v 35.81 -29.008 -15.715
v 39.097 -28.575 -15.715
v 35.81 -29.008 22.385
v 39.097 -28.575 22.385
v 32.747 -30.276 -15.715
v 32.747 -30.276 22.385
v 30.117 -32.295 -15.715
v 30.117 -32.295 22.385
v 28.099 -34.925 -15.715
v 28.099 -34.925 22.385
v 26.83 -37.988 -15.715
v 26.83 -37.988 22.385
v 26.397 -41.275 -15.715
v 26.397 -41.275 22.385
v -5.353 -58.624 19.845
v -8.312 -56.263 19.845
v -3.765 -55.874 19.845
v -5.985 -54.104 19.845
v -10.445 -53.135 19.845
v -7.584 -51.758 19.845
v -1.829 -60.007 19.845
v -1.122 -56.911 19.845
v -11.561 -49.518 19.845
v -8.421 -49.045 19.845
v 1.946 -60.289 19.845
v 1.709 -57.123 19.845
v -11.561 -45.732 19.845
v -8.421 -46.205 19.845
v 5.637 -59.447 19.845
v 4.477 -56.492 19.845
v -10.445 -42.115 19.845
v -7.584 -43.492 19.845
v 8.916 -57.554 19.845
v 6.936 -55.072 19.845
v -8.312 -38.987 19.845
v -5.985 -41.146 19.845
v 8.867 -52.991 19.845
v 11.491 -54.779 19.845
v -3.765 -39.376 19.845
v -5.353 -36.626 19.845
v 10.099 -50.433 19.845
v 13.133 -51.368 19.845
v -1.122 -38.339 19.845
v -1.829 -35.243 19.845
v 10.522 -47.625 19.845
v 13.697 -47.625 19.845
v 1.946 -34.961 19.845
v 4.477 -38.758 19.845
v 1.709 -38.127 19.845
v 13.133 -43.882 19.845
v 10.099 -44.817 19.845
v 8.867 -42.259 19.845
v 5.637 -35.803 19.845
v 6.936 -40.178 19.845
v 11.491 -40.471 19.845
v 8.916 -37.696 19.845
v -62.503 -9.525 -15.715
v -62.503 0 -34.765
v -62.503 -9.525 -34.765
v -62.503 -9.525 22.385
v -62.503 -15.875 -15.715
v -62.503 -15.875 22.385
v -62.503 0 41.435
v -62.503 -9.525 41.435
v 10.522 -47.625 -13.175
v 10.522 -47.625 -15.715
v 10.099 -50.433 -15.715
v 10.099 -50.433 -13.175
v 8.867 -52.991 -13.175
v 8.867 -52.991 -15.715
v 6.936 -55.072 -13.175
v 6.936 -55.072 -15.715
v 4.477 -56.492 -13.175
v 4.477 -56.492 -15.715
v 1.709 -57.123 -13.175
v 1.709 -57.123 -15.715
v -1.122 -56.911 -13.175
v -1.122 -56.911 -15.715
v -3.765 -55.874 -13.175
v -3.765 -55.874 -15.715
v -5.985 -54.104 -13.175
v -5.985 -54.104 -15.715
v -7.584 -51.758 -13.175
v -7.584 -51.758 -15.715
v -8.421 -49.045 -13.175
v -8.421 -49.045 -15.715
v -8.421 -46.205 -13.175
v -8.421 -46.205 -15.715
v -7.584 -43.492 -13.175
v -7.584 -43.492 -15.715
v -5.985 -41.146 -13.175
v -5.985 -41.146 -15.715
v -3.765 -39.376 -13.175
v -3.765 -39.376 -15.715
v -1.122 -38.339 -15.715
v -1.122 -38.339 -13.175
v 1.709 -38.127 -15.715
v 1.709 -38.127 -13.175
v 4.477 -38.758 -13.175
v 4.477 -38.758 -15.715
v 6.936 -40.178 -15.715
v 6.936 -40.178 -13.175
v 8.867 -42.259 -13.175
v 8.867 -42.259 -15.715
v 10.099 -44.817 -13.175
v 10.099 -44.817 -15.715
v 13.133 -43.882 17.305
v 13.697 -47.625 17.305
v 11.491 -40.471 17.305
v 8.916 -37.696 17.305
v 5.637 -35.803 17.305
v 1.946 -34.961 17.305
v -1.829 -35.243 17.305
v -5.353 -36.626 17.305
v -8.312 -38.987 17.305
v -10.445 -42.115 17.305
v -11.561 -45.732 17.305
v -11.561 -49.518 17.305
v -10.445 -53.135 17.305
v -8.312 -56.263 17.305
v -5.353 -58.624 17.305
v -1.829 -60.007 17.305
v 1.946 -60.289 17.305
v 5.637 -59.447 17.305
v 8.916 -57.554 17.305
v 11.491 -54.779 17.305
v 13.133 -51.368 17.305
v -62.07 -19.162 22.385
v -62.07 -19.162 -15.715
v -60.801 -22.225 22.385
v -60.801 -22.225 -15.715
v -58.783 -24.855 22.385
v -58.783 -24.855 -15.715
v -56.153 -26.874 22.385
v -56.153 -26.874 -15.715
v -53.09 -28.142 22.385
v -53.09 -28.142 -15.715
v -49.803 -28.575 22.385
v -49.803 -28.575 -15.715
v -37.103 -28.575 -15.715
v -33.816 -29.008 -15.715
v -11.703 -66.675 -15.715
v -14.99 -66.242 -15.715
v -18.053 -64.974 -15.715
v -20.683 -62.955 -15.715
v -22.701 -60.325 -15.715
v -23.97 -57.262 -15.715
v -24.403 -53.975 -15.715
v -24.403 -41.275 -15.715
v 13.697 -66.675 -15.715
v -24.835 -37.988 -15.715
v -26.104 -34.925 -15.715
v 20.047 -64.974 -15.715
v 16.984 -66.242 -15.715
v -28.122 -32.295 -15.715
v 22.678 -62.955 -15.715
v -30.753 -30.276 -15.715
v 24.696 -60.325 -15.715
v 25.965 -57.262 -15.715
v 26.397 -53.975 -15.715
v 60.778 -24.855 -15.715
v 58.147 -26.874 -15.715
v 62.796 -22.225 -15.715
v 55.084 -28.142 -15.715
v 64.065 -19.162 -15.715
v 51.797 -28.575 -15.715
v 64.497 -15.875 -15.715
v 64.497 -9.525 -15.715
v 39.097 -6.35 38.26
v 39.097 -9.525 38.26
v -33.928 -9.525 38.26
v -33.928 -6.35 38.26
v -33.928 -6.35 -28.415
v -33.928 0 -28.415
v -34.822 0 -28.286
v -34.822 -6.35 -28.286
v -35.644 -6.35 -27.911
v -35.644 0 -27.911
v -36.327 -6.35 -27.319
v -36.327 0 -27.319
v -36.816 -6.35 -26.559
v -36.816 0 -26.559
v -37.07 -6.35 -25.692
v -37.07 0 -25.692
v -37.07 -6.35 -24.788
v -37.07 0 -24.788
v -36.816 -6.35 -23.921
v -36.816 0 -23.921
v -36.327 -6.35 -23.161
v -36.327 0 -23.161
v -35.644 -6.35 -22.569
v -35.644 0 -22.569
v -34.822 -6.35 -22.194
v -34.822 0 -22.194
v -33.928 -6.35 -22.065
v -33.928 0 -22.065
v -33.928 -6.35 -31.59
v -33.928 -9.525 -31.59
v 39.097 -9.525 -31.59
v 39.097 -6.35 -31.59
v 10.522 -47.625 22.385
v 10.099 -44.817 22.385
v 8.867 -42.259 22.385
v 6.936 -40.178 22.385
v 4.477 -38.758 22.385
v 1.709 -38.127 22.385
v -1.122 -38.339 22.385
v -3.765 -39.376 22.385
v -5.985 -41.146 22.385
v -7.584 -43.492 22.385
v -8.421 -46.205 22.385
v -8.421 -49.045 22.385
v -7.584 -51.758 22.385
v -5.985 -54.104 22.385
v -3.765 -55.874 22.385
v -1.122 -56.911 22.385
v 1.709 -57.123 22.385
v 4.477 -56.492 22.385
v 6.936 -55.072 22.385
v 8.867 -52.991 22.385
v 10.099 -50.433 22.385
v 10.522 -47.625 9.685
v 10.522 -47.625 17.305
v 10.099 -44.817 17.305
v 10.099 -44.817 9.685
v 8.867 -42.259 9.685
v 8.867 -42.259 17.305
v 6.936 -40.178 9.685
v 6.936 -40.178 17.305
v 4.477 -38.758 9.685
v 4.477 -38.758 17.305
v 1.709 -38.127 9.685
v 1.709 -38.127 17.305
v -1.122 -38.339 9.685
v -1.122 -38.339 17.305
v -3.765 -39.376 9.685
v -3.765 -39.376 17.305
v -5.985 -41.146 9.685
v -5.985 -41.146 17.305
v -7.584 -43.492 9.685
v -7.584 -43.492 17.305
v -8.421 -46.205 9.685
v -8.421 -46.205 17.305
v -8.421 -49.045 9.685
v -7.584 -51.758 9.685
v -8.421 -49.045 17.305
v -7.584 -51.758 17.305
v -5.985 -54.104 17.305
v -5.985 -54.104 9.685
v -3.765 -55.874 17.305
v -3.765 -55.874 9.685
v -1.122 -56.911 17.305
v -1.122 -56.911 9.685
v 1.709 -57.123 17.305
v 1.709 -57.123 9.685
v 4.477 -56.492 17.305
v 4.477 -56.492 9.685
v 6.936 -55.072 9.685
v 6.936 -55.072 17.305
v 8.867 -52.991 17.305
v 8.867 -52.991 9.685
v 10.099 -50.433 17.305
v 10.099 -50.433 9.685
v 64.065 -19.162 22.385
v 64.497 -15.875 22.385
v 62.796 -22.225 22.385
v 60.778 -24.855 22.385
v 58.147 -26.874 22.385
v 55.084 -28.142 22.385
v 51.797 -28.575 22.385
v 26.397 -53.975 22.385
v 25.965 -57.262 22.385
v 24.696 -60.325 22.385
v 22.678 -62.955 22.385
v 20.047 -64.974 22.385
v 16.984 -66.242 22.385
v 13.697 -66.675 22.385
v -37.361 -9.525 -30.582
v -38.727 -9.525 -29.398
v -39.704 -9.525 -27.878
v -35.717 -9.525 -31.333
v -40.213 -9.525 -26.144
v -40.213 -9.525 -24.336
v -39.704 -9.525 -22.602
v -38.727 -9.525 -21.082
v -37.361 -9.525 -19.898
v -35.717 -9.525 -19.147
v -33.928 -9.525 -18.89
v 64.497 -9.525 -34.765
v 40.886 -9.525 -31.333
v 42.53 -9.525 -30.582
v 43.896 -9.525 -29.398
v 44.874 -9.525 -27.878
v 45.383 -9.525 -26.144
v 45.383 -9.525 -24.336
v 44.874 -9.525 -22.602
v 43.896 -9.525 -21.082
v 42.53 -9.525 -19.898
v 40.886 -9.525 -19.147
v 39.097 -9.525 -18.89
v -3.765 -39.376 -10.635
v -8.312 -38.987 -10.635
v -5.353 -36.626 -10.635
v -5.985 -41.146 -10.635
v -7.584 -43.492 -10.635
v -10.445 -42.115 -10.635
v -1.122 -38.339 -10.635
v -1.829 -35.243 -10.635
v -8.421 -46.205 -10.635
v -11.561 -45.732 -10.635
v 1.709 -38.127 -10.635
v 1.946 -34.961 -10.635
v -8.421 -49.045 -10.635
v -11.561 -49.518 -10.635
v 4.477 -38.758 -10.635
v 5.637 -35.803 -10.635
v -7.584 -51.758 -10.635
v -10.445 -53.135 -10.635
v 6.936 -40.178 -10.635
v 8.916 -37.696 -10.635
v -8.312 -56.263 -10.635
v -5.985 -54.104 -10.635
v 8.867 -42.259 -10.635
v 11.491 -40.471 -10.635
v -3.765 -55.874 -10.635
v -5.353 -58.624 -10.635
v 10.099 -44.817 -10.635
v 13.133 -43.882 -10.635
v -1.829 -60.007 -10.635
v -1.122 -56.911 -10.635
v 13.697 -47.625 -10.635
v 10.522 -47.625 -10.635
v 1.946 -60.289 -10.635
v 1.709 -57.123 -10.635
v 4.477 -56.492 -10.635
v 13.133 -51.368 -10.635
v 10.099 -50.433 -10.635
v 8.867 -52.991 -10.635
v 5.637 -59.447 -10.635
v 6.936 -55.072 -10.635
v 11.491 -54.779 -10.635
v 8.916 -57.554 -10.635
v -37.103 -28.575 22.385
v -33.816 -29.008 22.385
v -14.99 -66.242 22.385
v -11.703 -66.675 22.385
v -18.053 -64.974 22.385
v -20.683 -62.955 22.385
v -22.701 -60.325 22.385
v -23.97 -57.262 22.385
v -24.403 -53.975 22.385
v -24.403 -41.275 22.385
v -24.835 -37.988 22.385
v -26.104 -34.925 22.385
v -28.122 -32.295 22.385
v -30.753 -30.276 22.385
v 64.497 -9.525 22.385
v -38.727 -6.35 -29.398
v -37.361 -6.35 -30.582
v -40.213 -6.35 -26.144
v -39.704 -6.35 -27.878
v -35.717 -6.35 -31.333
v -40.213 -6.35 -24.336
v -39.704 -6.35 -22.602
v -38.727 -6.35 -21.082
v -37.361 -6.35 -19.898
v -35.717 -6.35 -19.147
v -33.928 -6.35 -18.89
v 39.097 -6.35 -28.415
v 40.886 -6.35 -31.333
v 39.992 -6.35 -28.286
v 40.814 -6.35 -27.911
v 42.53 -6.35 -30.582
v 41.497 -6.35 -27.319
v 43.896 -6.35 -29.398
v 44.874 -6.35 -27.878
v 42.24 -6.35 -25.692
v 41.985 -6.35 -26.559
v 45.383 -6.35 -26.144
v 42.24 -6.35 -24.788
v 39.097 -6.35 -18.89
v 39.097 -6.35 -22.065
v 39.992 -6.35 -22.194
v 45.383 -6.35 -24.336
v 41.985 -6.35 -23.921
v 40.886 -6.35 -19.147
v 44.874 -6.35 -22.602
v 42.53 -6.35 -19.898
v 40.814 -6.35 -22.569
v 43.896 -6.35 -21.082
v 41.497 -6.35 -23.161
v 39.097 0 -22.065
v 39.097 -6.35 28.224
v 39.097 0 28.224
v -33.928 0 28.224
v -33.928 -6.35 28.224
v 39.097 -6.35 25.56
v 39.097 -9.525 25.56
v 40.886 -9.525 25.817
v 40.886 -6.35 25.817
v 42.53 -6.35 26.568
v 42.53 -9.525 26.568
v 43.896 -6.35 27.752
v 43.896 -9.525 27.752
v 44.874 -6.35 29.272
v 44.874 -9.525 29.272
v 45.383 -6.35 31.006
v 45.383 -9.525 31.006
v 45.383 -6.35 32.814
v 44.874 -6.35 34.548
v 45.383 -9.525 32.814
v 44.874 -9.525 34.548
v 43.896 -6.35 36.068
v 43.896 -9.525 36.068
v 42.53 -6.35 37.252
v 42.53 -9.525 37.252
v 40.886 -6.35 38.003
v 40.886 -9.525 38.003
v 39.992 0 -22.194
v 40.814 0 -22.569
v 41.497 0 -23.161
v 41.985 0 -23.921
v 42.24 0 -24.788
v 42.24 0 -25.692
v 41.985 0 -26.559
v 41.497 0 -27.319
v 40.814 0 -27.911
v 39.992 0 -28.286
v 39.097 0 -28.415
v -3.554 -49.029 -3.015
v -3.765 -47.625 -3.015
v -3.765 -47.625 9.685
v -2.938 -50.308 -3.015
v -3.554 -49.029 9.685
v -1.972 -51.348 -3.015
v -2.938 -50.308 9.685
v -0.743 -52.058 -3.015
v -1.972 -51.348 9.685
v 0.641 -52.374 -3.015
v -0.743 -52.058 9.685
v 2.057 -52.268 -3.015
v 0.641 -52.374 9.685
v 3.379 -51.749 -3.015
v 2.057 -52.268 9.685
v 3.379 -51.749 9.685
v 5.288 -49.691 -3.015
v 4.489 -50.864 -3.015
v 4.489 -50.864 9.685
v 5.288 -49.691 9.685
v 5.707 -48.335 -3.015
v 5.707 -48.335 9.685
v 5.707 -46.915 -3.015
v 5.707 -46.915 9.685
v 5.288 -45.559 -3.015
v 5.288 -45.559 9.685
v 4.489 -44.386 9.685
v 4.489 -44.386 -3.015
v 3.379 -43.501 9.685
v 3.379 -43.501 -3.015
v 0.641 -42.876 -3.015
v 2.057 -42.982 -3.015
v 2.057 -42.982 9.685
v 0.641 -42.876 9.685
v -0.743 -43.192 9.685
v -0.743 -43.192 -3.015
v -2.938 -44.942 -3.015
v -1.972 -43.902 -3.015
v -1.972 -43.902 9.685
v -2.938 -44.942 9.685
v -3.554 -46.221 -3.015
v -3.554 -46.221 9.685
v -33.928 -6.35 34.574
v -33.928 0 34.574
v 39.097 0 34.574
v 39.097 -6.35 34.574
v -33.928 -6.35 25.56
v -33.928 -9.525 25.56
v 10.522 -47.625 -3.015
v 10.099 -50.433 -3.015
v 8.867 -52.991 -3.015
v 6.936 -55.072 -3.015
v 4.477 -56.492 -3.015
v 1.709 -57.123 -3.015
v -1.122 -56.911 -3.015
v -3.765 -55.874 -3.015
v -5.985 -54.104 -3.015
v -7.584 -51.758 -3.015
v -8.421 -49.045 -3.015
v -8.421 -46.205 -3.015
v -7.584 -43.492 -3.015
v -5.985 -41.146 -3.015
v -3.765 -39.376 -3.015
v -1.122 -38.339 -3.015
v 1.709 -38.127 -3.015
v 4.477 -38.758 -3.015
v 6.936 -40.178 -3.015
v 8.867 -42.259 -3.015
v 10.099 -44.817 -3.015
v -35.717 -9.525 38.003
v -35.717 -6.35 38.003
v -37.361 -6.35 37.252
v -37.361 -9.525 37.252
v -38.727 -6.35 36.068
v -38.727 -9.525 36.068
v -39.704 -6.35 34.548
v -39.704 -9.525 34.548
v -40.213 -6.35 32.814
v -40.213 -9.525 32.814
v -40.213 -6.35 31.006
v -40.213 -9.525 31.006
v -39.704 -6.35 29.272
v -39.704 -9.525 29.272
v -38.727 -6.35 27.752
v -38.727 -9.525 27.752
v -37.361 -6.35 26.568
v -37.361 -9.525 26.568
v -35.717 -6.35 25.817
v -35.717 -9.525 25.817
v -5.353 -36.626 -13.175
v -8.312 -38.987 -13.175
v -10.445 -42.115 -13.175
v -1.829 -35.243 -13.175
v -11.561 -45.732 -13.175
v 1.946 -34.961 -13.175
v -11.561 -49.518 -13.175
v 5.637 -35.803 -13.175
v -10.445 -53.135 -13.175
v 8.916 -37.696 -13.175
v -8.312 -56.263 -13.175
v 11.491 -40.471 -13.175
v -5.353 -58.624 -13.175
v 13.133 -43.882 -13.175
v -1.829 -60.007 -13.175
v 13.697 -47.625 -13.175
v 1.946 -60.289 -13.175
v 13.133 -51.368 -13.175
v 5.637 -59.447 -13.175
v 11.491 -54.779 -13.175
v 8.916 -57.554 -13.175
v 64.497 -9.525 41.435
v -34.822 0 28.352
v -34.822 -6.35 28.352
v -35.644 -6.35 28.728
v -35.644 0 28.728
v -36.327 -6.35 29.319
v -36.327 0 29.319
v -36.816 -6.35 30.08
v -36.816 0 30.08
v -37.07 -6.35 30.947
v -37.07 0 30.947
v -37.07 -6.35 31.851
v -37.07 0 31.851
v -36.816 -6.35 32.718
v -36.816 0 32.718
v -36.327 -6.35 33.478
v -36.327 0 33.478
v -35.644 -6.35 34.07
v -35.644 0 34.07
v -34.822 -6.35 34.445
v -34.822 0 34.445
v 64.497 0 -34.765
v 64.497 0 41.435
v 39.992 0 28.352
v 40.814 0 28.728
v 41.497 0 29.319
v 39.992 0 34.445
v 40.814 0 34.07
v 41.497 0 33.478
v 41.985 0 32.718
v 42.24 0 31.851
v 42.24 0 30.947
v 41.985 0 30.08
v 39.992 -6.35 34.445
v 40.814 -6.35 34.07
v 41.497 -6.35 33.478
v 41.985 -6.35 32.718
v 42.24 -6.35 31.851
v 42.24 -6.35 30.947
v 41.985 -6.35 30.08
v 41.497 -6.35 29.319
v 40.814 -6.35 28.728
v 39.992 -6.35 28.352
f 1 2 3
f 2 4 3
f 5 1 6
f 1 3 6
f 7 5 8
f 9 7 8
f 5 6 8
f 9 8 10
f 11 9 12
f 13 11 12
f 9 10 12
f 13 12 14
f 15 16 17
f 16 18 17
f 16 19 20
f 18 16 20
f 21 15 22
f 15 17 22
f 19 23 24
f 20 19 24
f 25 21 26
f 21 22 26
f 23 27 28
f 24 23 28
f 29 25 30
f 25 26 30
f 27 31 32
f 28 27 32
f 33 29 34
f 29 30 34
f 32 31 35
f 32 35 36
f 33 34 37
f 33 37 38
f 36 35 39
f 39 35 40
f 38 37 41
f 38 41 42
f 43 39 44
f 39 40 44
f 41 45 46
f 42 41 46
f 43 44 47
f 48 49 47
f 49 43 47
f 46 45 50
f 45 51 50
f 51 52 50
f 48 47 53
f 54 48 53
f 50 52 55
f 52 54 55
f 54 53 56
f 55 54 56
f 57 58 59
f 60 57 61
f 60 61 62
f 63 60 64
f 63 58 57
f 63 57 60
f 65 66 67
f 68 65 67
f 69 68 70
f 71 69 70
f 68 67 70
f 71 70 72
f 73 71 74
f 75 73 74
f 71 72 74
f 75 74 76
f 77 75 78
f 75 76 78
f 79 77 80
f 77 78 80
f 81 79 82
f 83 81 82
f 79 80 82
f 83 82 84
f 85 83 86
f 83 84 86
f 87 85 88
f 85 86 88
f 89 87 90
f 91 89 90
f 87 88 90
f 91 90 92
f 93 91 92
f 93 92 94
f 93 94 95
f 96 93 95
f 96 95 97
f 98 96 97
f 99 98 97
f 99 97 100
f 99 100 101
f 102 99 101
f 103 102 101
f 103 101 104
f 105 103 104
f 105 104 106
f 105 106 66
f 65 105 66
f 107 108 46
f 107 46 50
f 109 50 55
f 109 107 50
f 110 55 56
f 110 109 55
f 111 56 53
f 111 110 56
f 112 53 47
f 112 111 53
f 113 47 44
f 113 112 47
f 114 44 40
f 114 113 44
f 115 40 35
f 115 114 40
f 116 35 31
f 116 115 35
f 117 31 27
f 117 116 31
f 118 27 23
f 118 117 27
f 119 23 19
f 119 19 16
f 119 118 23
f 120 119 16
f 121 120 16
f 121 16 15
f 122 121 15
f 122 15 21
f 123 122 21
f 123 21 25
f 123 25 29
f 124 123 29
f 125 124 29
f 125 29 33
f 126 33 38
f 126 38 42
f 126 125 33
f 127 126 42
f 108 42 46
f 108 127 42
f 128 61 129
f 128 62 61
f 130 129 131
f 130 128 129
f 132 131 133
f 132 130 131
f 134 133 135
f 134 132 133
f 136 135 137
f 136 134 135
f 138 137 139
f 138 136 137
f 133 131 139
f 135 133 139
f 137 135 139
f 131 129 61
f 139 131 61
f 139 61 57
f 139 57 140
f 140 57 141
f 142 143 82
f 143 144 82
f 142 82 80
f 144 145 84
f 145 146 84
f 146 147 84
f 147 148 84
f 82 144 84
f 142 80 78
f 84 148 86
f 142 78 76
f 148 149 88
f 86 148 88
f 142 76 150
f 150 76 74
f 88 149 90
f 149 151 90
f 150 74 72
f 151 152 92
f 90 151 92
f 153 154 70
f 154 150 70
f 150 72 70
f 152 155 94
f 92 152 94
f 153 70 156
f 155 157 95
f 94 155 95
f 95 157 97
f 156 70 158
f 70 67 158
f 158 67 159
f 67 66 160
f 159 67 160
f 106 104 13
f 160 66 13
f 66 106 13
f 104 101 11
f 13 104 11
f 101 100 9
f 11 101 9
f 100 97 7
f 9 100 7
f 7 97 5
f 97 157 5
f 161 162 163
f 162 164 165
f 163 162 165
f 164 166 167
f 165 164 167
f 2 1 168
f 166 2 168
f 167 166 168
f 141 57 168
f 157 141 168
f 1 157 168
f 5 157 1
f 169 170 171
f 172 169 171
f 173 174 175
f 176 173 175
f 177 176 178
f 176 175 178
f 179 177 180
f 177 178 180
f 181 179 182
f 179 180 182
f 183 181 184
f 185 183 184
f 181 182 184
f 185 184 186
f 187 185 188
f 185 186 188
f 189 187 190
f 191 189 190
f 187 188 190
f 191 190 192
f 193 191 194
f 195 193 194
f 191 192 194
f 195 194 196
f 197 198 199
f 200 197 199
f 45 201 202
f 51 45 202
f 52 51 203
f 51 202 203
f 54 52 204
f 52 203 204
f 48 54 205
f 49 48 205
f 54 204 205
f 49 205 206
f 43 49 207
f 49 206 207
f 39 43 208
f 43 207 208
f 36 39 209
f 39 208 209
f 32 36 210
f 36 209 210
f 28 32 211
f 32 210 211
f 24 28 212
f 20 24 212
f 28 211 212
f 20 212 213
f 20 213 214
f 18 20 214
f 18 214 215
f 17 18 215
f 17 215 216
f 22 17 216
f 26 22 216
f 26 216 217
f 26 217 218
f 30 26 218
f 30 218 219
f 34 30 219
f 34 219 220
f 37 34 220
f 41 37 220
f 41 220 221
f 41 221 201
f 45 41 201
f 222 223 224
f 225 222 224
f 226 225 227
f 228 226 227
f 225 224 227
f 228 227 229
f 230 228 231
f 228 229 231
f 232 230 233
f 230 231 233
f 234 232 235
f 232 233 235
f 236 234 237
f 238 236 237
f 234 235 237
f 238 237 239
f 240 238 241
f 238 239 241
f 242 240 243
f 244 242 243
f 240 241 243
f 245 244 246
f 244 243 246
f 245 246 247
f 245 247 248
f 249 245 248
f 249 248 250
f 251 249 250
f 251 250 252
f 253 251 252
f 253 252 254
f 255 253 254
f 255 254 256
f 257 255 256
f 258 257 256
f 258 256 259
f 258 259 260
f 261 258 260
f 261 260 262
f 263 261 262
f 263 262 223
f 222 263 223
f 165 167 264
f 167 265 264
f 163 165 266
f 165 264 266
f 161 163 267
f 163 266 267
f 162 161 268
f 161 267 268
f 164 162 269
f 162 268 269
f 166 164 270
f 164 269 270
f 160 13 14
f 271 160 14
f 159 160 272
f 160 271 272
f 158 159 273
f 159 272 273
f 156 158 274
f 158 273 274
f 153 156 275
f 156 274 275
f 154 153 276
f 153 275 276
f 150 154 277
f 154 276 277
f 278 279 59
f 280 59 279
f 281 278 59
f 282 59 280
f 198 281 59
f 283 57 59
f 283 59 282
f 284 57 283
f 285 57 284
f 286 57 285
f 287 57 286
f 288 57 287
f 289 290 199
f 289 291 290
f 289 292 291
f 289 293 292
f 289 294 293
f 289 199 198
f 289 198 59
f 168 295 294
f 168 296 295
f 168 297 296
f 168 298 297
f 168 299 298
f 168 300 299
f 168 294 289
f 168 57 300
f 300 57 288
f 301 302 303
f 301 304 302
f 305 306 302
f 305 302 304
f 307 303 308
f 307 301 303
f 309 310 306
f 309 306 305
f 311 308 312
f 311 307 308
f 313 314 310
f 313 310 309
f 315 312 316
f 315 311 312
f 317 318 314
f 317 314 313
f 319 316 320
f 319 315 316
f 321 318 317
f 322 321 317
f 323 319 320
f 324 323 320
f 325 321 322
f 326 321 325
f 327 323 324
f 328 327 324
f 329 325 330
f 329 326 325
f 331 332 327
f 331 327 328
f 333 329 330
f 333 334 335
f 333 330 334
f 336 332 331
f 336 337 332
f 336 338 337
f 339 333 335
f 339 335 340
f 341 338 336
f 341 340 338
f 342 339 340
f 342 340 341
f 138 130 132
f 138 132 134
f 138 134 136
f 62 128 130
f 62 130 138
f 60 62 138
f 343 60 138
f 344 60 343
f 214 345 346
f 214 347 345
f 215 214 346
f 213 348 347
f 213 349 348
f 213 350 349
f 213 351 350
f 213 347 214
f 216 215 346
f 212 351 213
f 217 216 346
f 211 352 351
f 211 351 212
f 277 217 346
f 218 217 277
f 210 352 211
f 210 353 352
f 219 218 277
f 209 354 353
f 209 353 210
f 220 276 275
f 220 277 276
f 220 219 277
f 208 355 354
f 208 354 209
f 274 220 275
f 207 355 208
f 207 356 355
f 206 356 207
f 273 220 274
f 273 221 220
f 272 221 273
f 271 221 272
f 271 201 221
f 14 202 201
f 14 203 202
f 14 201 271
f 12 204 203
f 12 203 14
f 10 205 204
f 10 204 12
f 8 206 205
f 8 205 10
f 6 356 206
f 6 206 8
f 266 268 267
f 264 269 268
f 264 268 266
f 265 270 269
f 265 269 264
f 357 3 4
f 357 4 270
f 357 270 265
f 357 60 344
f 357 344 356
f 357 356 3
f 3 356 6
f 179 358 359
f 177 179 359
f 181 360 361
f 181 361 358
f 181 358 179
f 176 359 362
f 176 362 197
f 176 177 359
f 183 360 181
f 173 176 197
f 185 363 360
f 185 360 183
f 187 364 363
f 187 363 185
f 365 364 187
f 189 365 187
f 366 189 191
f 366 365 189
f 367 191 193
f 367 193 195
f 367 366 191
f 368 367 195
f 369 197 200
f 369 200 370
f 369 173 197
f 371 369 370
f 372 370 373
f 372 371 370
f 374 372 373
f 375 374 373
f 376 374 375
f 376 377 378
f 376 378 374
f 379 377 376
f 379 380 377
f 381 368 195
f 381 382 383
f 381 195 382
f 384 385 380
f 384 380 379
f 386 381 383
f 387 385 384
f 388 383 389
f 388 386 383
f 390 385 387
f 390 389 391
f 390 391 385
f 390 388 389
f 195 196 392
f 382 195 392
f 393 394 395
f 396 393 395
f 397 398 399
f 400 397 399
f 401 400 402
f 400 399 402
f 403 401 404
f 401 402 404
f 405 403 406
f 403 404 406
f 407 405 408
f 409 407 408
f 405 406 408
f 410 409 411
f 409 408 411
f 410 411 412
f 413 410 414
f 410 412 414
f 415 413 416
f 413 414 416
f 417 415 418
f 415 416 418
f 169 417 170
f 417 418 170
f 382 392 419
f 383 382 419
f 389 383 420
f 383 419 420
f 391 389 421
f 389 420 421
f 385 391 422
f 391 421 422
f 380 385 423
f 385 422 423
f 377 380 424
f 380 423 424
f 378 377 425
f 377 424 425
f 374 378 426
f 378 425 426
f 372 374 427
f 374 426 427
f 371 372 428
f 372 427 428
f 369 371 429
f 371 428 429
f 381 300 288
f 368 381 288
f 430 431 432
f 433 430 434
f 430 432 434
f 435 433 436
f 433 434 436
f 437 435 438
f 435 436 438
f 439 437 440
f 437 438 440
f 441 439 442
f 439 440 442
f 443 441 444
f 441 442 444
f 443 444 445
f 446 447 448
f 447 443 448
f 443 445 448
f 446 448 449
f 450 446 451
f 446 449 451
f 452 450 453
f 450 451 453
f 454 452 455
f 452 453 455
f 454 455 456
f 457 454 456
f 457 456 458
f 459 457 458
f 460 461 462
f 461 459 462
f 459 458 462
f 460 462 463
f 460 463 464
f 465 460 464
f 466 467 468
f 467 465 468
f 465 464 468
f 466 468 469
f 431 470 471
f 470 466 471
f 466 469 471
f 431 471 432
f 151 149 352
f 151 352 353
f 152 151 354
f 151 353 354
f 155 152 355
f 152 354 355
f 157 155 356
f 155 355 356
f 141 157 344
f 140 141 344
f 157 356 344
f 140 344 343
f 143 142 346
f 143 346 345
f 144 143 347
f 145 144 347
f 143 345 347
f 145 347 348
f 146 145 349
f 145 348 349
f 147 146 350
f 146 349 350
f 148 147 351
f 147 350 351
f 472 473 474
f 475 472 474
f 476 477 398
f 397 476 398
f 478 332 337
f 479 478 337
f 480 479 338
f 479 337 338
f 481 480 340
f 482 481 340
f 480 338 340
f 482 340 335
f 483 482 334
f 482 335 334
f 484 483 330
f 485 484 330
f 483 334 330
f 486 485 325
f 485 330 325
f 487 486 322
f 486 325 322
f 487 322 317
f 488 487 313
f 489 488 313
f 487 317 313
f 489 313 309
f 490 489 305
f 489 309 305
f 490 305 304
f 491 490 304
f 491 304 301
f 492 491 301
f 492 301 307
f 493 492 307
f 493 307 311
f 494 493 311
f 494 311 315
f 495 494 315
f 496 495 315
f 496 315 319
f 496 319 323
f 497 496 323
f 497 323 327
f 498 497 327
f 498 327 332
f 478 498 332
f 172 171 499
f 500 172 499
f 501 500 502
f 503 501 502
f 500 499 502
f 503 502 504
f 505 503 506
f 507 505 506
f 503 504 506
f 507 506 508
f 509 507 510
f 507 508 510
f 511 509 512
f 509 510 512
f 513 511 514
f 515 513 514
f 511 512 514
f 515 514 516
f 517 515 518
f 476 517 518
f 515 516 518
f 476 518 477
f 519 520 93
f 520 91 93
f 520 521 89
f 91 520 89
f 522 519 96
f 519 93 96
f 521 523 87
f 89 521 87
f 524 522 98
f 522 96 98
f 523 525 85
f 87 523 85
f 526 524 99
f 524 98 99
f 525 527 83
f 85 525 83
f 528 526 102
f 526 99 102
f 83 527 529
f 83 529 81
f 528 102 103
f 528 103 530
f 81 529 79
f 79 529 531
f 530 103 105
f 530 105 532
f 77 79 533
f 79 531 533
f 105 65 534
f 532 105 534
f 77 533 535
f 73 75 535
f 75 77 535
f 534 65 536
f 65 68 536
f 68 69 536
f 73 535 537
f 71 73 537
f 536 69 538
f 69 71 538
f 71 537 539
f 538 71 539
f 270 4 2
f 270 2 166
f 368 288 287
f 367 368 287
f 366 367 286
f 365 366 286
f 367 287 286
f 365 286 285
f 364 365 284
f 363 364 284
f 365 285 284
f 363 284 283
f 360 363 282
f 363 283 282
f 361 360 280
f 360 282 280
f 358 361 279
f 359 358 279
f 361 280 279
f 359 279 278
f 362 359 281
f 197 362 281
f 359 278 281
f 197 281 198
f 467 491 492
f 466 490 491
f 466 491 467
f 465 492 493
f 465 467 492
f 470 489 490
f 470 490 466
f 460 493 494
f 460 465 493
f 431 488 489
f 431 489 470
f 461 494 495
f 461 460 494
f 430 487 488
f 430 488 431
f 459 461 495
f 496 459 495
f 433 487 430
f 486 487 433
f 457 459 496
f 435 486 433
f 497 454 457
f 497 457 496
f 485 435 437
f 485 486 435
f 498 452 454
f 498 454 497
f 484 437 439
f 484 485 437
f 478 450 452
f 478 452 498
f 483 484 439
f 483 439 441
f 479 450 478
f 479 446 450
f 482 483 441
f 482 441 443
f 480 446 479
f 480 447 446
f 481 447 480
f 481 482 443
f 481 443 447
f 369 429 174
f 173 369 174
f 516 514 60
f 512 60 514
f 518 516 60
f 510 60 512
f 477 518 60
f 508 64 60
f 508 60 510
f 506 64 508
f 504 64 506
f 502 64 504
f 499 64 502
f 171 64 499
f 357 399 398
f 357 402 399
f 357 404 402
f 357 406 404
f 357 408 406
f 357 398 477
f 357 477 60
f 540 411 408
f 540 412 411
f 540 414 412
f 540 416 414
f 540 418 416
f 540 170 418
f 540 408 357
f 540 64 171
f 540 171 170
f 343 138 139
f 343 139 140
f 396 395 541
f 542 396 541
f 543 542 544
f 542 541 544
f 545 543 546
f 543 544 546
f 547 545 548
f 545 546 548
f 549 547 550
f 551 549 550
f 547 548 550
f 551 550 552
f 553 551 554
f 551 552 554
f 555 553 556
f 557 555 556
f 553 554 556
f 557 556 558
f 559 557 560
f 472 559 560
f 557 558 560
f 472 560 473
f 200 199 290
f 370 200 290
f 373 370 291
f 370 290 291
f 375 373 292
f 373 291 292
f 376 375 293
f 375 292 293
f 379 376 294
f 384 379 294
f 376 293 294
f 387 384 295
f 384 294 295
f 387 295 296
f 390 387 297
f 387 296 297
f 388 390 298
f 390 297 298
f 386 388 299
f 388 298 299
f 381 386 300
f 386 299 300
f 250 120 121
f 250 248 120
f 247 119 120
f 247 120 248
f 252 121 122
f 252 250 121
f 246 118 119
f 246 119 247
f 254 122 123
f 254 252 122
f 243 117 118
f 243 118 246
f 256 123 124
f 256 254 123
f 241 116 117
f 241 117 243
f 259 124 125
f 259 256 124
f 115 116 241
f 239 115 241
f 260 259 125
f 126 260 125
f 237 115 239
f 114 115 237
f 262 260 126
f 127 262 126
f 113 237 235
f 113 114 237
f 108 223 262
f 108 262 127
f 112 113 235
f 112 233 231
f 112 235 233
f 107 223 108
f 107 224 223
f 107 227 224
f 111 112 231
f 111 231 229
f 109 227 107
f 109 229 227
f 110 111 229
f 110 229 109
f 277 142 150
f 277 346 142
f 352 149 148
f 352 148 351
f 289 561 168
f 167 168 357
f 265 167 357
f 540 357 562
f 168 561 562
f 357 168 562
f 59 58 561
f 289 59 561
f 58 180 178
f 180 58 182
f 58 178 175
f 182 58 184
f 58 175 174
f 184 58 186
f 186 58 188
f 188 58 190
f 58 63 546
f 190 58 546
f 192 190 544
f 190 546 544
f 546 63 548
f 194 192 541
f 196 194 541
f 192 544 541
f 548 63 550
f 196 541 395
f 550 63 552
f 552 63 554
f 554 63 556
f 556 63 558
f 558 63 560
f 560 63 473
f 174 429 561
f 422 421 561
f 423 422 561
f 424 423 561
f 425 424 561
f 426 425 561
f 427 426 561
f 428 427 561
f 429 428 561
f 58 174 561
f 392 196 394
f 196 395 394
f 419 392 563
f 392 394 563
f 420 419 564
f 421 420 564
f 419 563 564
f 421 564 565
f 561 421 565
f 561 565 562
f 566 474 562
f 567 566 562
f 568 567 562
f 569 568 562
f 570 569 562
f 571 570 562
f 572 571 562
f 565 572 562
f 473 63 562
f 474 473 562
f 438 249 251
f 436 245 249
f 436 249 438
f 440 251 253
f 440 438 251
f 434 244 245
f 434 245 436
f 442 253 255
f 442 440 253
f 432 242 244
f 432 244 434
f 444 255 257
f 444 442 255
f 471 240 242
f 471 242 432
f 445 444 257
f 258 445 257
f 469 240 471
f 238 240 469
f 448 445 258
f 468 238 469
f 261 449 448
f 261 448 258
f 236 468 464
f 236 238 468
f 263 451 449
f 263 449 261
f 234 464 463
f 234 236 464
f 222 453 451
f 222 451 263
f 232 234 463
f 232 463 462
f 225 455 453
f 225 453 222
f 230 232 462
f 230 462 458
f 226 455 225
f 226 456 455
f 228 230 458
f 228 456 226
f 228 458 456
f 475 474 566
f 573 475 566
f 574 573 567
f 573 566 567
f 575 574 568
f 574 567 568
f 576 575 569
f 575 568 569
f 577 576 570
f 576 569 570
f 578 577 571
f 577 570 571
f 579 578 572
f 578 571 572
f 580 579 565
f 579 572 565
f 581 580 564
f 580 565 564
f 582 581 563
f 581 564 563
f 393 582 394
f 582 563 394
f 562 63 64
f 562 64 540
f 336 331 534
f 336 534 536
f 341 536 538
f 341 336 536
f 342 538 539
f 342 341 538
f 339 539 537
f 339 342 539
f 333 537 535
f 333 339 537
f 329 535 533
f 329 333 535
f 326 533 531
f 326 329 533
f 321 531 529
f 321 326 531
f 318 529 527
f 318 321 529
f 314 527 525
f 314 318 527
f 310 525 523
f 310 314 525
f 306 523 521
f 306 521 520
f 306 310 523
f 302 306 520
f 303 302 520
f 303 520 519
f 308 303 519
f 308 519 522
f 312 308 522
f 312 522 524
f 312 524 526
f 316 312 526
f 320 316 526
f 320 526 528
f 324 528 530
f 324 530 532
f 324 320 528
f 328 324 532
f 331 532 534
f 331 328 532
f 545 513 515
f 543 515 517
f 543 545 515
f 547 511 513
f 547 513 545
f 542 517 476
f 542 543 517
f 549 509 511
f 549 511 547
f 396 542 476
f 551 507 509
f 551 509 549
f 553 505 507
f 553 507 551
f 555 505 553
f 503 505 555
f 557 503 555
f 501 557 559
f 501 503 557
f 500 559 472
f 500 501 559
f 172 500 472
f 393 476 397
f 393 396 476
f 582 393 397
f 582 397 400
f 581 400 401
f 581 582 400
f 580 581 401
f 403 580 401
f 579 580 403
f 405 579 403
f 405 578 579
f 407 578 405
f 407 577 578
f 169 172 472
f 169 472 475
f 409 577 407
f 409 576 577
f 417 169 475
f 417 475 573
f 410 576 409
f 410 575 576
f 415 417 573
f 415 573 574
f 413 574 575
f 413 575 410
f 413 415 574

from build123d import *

# Parameters (mm, degrees)
F0_W       = 127
F0_H       = 76.2
F1_DEPTH   = 9.525
F3_DEPTH   = 3.175
F4_W       = 127
F4_H       = 38.1
F5_DEPTH   = 19.05
F6_W       = 50.8
F6_H       = 38.1
F7_DEPTH   = 38.1
F9_D       = 9.525
F10_R      = 9.525
F10_R_2    = 4.7625
F11_DEPTH  = 12.7
F12_R      = 9.525
F12_R_2    = 4.7625
F13_DEPTH  = 12.7
F17_R      = 12.7
F7_FACE_R  = 9.525
F18_DEPTH  = 2.54
F15_R      = 12.7
F7_FACE1_R = 9.525
F19_DEPTH  = 2.54
F20_R      = 12.7
F21_R      = 12.7


with BuildPart() as f1:
    # F0 (on Front) → F1 (new body)
    with BuildSketch(Plane.XZ):
        with Locations((0.997369945, 3.3350293577)):
            Rectangle(F0_W, F0_H)
        with BuildLine():
            ThreePointArc((-33.927630055, -28.4149706423), (-37.102630055, -25.2399706423), (-33.927630055, -22.0649706423))
            Line((-33.927630055, -22.0649706423), (39.097369945, -22.0649706423))
            ThreePointArc((39.097369945, -22.0649706423), (42.272369945, -25.2399706423), (39.097369945, -28.4149706423))
            Line((39.097369945, -28.4149706423), (-33.927630055, -28.4149706423))
        make_face(mode=Mode.SUBTRACT)
        with BuildLine():
            Line((39.097369945, 28.2236666642), (-33.927630055, 28.2236666642))
            ThreePointArc((-33.927630055, 28.2236666642), (-37.102630055, 31.3986666642), (-33.927630055, 34.5736666642))
            Line((-33.927630055, 34.5736666642), (39.097369945, 34.5736666642))
            ThreePointArc((39.097369945, 34.5736666642), (42.272369945, 31.3986666642), (39.097369945, 28.2236666642))
        make_face(mode=Mode.SUBTRACT)
    extrude(amount=F1_DEPTH)

    # F2 (on face) → F3 (cut)
    with BuildSketch(Plane.XZ.offset(9.525)):
        with BuildLine():
            Line((39.097369945, -18.8899706423), (-33.927630055, -18.8899706423))
            ThreePointArc((-33.927630055, -18.8899706423), (-40.277630055, -25.2399706423), (-33.927630055, -31.5899706423))
            Line((-33.927630055, -31.5899706423), (39.097369945, -31.5899706423))
            ThreePointArc((39.097369945, -31.5899706423), (45.447369945, -25.2399706423), (39.097369945, -18.8899706423))
        make_face()
        with BuildLine():
            Line((39.097369945, -28.4149706423), (-33.927630055, -28.4149706423))
            ThreePointArc((-33.927630055, -28.4149706423), (-37.102630055, -25.2399706423), (-33.927630055, -22.0649706423))
            Line((-33.927630055, -22.0649706423), (39.097369945, -22.0649706423))
            ThreePointArc((39.097369945, -22.0649706423), (42.272369945, -25.2399706423), (39.097369945, -28.4149706423))
        make_face(mode=Mode.SUBTRACT)
        with BuildLine():
            ThreePointArc((-33.927630055, 38.2600293577), (-40.277630055, 31.9100293577), (-33.927630055, 25.5600293577))
            Line((-33.927630055, 25.5600293577), (39.097369945, 25.5600293577))
            ThreePointArc((39.097369945, 25.5600293577), (45.447369945, 31.9100293577), (39.097369945, 38.2600293577))
            Line((39.097369945, 38.2600293577), (-33.927630055, 38.2600293577))
        make_face()
        with BuildLine():
            Line((-33.927630055, 34.5736666642), (39.097369945, 34.5736666642))
            ThreePointArc((39.097369945, 34.5736666642), (42.272369945, 31.3986666642), (39.097369945, 28.2236666642))
            Line((39.097369945, 28.2236666642), (-33.927630055, 28.2236666642))
            ThreePointArc((-33.927630055, 28.2236666642), (-37.102630055, 31.3986666642), (-33.927630055, 34.5736666642))
        make_face(mode=Mode.SUBTRACT)
    extrude(amount=-F3_DEPTH, mode=Mode.SUBTRACT)

    # F4 (on face) → F5 (join)
    with BuildSketch(Plane.XZ.offset(9.525)):
        with Locations((0.997369945, 3.3350293577)):
            Rectangle(F4_W, F4_H)
    extrude(amount=F5_DEPTH)

    # F6 (on face) → F7 (join)
    with BuildSketch(Plane.XZ.offset(28.575)):
        with Locations((0.997369945, 3.3350293577)):
            Rectangle(F6_W, F6_H)
    extrude(amount=F7_DEPTH)

    # F9 (through all)
    with Locations(Plane(origin=(0, 0, -15.7149706423), x_dir=(1, 0, 0), z_dir=(0, 0, -1))):
        with Locations((0.997369945, 47.625)):
            Hole(F9_D / 2)

    # F10 (on face) → F11 (cut)
    with BuildSketch(Plane(origin=(0, 0, -15.7149706423), x_dir=(1, 0, 0), z_dir=(0, 0, -1))):
        with Locations((0.997369945, 47.625)):
            Circle(F10_R)
        with Locations((0.997369945, 47.625)):
            Circle(F10_R_2, mode=Mode.SUBTRACT)
    extrude(amount=-F11_DEPTH, mode=Mode.SUBTRACT)

    # F12 (on face) → F13 (cut)
    with BuildSketch(Plane.XY.offset(22.3850293577)):
        with Locations((0.997369945, -47.625)):
            Circle(F12_R)
        with Locations((0.997369945, -47.625)):
            Circle(F12_R_2, mode=Mode.SUBTRACT)
        with Locations((0.997369945, -47.625)):
            Circle(F12_R)
    extrude(amount=-F13_DEPTH, mode=Mode.SUBTRACT)

    # F17 (on offset) + F7_face (on face) → F18 (cut)
    with BuildSketch(Plane(origin=(0, 0, -10.6349706423), x_dir=(1, 0, 0), z_dir=(0, 0, -1))):
        with Locations((0.997369945, 47.625)):
            Circle(F17_R)
    with BuildSketch(Plane(origin=(0.997369945, -31.75, -15.7149706423), x_dir=(1, 0, 0), z_dir=(0, 0, -1))):
        Polygon((-63.5, -3.175), (-63.5, -22.225), (63.5, -22.225), (63.5, -3.175), (25.4, -3.175), (25.4, 34.925), (-25.4, 34.925), (-25.4, -3.175), align=None)
        with Locations((0, 15.875)):
            Circle(F7_FACE_R, mode=Mode.SUBTRACT)
    extrude(amount=F18_DEPTH, mode=Mode.SUBTRACT)

    # F15 (on offset) + F7_face1 (on face) → F19 (cut)
    with BuildSketch(Plane.XY.offset(17.3050293577)):
        with Locations((0.997369945, -47.625)):
            Circle(F15_R)
    with BuildSketch(Plane(origin=(0.997369945, -31.4859250029, 22.3850293577), x_dir=(1, 0, 0), z_dir=(0, 0, 1))):
        Polygon((63.5, 2.9109250029), (63.5, 21.9609250029), (-63.5, 21.9609250029), (-63.5, 2.9109250029), (-25.4, 2.9109250029), (-25.4, -35.1890749971), (25.4, -35.1890749971), (25.4, 2.9109250029), align=None)
        with Locations((0, -16.1390749971)):
            Circle(F7_FACE1_R, mode=Mode.SUBTRACT)
    extrude(amount=F19_DEPTH, mode=Mode.SUBTRACT)

    # F20
    f20_edges = [f1.edges().sort_by_distance(p)[0] for p in [
        (-62.50263, -28.575, 3.335029),
        (-24.40263, -28.575, 3.335029),
        (-24.40263, -66.675, 3.335029),
        (26.39737, -66.675, 3.335029),
        (26.39737, -28.575, 3.335029),
    ]]
    fillet(f20_edges, radius=F20_R)

    # F21
    f21_edges = [f1.edges().sort_by_distance(p)[0] for p in [
        (64.49737, -28.575, 3.335029),
    ]]
    fillet(f21_edges, radius=F21_R)


solid = f1.part
